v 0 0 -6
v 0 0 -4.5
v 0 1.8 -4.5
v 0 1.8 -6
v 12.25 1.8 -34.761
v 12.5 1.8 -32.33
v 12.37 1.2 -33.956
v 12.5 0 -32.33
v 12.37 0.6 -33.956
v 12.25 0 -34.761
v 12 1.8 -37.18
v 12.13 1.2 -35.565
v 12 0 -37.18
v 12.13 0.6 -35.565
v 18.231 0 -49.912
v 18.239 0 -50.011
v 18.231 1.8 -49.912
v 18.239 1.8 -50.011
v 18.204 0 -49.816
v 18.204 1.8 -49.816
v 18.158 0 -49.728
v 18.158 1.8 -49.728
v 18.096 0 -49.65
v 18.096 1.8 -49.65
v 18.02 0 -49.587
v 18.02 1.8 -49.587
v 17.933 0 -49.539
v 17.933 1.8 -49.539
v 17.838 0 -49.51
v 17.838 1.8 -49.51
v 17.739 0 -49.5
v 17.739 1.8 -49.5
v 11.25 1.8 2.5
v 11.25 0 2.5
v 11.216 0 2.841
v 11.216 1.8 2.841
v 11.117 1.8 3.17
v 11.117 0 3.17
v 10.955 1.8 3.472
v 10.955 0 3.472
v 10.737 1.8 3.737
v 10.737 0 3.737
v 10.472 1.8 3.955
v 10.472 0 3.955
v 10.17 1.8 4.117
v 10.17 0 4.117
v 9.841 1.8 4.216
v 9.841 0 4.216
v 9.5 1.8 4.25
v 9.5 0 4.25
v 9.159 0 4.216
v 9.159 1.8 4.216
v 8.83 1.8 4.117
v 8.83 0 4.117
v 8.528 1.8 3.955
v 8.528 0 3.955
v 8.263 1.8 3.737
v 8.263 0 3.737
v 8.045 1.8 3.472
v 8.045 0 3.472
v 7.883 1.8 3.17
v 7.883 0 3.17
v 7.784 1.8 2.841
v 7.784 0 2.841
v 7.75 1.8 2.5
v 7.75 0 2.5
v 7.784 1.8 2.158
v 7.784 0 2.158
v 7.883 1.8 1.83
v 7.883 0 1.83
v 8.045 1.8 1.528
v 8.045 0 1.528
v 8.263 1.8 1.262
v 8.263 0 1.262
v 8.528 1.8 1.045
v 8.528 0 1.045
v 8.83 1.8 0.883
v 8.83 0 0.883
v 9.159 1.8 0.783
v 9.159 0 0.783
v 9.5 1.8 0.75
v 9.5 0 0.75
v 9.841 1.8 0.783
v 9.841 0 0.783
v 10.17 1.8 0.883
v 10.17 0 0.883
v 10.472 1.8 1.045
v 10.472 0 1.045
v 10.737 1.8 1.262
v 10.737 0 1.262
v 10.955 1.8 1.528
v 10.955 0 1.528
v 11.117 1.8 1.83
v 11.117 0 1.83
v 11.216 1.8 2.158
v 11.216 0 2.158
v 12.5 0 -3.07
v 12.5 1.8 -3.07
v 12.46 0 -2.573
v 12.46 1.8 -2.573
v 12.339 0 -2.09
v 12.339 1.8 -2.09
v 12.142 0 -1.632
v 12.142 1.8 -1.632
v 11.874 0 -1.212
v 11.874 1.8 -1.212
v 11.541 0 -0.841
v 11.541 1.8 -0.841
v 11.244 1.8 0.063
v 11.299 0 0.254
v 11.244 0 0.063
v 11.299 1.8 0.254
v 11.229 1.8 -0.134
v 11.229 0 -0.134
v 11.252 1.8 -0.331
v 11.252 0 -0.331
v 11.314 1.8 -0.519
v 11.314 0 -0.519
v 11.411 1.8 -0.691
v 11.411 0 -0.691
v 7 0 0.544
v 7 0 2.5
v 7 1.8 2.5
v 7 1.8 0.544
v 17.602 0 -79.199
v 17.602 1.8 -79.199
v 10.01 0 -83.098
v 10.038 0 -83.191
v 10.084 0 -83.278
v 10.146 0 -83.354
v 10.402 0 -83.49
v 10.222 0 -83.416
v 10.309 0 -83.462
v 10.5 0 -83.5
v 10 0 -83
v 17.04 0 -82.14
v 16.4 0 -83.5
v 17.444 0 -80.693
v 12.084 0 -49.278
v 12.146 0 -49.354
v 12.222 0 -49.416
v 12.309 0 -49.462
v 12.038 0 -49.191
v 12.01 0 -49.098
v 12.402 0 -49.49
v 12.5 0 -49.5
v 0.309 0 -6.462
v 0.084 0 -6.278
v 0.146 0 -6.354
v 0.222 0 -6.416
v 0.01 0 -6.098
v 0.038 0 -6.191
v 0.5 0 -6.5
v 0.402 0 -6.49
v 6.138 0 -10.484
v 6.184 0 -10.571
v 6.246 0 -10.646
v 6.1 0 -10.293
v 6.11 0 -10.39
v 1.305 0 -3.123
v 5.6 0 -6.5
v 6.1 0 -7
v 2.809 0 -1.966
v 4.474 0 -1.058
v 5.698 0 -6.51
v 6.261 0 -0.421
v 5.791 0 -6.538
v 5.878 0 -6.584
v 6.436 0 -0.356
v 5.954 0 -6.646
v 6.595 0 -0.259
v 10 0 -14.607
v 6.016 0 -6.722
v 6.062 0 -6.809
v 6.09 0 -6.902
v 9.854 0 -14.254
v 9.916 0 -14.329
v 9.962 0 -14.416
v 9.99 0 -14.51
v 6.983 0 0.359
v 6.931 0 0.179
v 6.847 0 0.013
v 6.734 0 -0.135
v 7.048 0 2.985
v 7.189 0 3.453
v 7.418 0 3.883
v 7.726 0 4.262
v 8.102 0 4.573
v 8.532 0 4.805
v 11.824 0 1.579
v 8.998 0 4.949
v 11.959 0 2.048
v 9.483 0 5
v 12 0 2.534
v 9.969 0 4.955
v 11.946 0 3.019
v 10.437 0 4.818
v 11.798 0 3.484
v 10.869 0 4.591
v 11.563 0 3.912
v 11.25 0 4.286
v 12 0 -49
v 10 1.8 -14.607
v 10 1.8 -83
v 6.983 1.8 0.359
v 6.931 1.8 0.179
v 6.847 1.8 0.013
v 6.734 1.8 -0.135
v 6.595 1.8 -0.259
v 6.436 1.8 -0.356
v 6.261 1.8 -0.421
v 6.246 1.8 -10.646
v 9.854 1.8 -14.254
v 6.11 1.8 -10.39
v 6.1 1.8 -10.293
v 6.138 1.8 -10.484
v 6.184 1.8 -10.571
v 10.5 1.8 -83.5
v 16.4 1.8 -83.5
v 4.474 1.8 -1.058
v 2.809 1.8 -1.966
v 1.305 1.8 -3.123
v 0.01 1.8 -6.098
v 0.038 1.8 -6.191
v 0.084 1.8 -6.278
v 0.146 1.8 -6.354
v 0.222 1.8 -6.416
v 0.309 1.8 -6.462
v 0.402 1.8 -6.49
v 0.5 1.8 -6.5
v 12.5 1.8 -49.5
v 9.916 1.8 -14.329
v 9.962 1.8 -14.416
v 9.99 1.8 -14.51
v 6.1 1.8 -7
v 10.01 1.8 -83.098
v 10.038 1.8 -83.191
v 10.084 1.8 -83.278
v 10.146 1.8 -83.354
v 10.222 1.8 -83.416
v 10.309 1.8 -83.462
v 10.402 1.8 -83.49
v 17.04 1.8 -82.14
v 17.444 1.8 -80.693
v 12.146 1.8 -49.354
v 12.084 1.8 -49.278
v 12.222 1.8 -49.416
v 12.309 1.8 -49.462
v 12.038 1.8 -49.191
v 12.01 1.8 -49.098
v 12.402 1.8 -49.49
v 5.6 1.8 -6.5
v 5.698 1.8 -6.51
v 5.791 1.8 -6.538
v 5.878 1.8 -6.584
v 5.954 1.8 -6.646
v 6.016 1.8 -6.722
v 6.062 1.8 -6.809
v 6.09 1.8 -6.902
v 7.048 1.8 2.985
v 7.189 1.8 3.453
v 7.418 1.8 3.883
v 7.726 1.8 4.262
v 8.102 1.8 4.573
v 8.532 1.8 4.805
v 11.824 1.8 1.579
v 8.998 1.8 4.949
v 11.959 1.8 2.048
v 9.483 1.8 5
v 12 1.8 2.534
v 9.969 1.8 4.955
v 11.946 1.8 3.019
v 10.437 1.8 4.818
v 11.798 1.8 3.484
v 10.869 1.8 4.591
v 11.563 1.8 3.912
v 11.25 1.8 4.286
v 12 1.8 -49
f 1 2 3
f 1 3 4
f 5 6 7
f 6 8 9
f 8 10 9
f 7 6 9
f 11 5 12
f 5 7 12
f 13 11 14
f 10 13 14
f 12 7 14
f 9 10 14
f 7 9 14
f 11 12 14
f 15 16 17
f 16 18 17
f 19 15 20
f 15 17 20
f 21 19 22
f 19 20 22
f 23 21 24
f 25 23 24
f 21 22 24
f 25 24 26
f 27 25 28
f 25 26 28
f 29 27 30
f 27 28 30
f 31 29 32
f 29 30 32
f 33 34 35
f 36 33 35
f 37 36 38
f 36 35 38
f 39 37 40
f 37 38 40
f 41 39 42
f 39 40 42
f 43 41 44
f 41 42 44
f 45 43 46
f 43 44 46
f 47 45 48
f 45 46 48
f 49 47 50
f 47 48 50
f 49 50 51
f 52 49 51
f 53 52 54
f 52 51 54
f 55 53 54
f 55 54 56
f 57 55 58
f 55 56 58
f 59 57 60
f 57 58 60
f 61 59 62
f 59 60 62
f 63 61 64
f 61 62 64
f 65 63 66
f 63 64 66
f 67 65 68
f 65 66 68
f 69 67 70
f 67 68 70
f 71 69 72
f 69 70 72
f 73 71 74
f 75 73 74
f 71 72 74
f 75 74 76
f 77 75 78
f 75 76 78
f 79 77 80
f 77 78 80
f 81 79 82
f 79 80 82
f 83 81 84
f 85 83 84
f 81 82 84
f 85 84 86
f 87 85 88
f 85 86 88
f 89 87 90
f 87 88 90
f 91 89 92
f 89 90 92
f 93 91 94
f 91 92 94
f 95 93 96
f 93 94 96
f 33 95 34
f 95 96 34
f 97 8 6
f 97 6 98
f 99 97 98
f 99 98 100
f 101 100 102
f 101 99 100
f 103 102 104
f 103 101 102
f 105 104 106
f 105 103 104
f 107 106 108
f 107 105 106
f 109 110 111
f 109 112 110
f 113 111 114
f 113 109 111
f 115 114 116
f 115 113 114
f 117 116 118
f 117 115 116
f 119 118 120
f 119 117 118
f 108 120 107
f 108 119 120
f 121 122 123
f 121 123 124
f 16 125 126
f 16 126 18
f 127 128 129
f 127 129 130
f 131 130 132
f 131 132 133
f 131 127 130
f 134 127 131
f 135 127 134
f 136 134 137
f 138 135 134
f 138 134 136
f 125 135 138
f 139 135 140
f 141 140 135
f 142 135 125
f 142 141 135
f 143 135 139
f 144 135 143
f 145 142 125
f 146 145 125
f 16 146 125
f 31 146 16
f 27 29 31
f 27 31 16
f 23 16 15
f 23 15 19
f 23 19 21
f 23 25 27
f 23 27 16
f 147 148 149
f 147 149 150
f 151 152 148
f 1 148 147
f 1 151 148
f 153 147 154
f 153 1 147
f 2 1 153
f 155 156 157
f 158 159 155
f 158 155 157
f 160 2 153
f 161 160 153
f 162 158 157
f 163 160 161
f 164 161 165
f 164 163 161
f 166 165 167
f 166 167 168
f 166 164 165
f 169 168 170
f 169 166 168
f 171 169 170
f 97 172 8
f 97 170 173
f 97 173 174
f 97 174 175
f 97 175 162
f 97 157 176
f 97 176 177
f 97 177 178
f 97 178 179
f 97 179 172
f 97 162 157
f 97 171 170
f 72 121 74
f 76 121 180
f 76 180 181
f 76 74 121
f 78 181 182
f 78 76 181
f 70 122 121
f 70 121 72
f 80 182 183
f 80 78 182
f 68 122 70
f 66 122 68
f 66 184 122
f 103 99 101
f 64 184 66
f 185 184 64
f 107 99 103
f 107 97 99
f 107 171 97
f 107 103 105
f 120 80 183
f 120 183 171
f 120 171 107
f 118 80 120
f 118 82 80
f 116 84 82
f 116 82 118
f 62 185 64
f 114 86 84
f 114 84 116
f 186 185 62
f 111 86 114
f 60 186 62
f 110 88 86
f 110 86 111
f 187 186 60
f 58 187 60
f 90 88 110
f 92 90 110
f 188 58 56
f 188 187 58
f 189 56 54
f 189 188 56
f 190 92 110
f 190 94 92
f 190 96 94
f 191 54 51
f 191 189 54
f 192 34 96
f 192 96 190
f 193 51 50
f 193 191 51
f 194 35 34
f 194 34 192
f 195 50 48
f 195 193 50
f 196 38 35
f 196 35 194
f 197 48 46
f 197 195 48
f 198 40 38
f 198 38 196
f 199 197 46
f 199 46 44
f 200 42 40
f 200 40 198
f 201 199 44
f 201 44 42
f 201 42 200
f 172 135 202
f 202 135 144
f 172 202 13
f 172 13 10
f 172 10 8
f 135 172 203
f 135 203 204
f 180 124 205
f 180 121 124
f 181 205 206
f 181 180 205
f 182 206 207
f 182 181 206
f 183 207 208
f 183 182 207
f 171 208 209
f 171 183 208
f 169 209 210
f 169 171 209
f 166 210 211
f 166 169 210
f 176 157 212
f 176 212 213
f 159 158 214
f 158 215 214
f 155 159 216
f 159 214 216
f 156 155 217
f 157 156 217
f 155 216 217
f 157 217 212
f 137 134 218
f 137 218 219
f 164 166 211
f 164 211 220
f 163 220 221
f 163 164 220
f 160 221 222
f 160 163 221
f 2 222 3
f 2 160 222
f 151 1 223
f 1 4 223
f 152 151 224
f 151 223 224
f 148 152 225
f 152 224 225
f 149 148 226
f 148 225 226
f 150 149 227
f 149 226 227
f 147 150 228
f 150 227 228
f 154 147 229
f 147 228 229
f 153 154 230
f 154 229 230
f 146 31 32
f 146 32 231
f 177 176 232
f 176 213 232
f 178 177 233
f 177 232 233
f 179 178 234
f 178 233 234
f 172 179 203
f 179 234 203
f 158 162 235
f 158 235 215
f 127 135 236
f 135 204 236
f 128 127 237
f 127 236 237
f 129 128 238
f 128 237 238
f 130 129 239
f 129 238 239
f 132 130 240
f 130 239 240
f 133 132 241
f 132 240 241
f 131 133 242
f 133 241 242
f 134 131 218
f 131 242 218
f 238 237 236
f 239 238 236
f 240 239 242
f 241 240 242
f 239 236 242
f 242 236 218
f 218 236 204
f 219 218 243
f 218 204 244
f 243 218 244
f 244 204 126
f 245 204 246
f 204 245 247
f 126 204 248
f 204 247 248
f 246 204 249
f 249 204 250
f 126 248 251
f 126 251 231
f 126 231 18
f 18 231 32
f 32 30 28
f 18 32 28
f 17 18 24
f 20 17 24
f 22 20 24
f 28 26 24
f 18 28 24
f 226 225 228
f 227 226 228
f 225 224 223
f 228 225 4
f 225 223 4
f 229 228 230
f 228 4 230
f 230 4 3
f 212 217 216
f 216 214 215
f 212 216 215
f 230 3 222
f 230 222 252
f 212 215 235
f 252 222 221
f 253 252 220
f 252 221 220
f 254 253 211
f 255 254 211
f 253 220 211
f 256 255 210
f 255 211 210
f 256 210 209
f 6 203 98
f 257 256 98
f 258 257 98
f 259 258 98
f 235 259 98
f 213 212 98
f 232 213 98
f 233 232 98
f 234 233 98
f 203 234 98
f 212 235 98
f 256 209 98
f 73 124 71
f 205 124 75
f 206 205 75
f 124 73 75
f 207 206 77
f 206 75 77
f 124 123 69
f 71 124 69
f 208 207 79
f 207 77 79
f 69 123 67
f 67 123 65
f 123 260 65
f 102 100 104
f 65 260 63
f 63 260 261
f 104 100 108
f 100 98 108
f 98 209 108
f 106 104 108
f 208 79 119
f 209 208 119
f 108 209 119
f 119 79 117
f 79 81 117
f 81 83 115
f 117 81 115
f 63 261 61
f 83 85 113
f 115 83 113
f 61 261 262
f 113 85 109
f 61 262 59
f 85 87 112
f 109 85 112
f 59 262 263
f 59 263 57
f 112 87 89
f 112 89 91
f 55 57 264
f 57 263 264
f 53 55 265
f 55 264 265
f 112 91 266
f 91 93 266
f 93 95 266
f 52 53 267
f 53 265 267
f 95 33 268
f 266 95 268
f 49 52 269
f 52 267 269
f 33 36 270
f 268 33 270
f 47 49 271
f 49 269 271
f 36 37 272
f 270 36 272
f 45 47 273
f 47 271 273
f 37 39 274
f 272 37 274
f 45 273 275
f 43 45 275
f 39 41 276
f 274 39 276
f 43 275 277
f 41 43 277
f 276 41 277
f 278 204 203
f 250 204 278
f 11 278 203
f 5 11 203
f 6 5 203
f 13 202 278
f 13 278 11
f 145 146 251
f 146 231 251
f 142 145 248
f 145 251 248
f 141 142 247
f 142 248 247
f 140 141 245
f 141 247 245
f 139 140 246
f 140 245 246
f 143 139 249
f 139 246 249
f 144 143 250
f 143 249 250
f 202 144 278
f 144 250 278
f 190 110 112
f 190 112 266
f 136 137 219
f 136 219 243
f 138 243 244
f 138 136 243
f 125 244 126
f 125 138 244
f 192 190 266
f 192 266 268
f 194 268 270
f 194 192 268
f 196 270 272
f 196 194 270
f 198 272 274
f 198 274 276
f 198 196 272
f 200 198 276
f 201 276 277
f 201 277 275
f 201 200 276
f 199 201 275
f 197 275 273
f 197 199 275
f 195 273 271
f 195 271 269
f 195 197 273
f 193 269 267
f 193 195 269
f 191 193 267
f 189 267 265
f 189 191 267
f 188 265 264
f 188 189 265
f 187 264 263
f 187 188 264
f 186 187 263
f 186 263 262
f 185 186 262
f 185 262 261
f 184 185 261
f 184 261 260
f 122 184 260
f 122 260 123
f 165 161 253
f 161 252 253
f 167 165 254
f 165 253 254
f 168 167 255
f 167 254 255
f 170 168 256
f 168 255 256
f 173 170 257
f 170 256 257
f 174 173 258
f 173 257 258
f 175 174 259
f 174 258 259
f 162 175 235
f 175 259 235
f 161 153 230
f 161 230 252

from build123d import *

# Parameters (mm, degrees)
BOSS_EXTRUDE1_DEPTH = 1.8
FILLET2_R           = 0.5
SKETCH3_R           = 2.5
SKETCH3_R_2         = 1.75
BOSS_EXTRUDE2_DEPTH = 1.8
FILLET3_R           = 1


with BuildPart() as part:
    # Sketch1 → Boss-Extrude1 (new body)
    with BuildSketch(Plane(origin=(0, 0, 0), x_dir=(1, 0, 0), z_dir=(0, 1, 0))):
        with BuildLine():
            Line((0, 4.5), (0, 6.5))
            Line((0, 6.5), (6.1, 6.5))
            Line((6.1, 6.5), (6.1, 10.5))
            Line((6.1, 10.5), (10, 14.4))
            Line((10, 14.4), (10, 83.5))
            Line((10, 83.5), (16.4, 83.5))
            ThreePointArc((16.4, 83.5), (17.2719581, 81.425344658), (17.601960582, 79.199226044))
            Line((17.601960582, 79.199226044), (18.25, 49.5))
            Line((18.25, 49.5), (12, 49.5))
            Line((12, 49.5), (12, 37.18))
            add(Edge.make_bspline(
                [(12.5, 32.33), (12.5, 33.972282338), (12, 35.554764974), (12, 37.18)],
                knots=[0, 0, 0, 0, 1, 1, 1, 1], degree=3))
            Line((12.5, 32.33), (12.5, 3.07))
            ThreePointArc((12.5, 3.07), (11.600817818, 0.899182182), (9.43, 0))
            ThreePointArc((9.43, 0), (4.205660329, 1.182650422), (0, 4.5))
        make_face()
    extrude(amount=BOSS_EXTRUDE1_DEPTH)

    # Fillet2
    fillet2_edges = [part.edges().sort_by_distance(p)[0] for p in [
        (0, 0.9, -6.5),
        (6.1, 0.9, -6.5),
        (6.1, 0.9, -10.5),
        (10, 0.9, -14.4),
        (10, 0.9, -83.5),
        (18.25, 0.9, -49.5),
        (12, 0.9, -49.5),
    ]]
    fillet(fillet2_edges, radius=FILLET2_R)

    # Sketch3 → Boss-Extrude2 (add)
    with BuildSketch(Plane.XZ):
        with Locations((9.5, 2.499832541)):
            Circle(SKETCH3_R)
        with Locations((9.5, 2.499832541)):
            Circle(SKETCH3_R_2, mode=Mode.SUBTRACT)
        with BuildLine():
            ThreePointArc((11.824045318, 1.578521867), (9.031018815, 0.044215175), (7, 2.499832541))
            Line((7, 2.499832541), (7, -0.245881701))
            ThreePointArc((7, -0.245881701), (8.2087959, -0.061626967), (9.43, 0))
            ThreePointArc((9.43, 0), (10.256451345, -0.113333266), (11.021883517, -0.444965358))
            Line((11.021883517, -0.444965358), (11.824045318, 1.578521867))
        make_face()
        with BuildLine():
            ThreePointArc((9.43, 0), (8.2087959, -0.061626967), (7, -0.245881701))
            Line((7, -0.245881701), (7, -0.500167459))
            Line((7, -0.500167459), (11, -0.500167459))
            Line((11, -0.500167459), (11.021883517, -0.444965358))
            ThreePointArc((11.021883517, -0.444965358), (10.256451345, -0.113333266), (9.43, 0))
        make_face()
    extrude(amount=-BOSS_EXTRUDE2_DEPTH)

    # Fillet3
    fillet3_edges = [part.edges().sort_by_distance(p)[0] for p in [
        (7, 0.9, -0.245881701),
        (11.021883517, 0.9, -0.444965358),
    ]]
    fillet(fillet3_edges, radius=FILLET3_R)


solid = part.part
